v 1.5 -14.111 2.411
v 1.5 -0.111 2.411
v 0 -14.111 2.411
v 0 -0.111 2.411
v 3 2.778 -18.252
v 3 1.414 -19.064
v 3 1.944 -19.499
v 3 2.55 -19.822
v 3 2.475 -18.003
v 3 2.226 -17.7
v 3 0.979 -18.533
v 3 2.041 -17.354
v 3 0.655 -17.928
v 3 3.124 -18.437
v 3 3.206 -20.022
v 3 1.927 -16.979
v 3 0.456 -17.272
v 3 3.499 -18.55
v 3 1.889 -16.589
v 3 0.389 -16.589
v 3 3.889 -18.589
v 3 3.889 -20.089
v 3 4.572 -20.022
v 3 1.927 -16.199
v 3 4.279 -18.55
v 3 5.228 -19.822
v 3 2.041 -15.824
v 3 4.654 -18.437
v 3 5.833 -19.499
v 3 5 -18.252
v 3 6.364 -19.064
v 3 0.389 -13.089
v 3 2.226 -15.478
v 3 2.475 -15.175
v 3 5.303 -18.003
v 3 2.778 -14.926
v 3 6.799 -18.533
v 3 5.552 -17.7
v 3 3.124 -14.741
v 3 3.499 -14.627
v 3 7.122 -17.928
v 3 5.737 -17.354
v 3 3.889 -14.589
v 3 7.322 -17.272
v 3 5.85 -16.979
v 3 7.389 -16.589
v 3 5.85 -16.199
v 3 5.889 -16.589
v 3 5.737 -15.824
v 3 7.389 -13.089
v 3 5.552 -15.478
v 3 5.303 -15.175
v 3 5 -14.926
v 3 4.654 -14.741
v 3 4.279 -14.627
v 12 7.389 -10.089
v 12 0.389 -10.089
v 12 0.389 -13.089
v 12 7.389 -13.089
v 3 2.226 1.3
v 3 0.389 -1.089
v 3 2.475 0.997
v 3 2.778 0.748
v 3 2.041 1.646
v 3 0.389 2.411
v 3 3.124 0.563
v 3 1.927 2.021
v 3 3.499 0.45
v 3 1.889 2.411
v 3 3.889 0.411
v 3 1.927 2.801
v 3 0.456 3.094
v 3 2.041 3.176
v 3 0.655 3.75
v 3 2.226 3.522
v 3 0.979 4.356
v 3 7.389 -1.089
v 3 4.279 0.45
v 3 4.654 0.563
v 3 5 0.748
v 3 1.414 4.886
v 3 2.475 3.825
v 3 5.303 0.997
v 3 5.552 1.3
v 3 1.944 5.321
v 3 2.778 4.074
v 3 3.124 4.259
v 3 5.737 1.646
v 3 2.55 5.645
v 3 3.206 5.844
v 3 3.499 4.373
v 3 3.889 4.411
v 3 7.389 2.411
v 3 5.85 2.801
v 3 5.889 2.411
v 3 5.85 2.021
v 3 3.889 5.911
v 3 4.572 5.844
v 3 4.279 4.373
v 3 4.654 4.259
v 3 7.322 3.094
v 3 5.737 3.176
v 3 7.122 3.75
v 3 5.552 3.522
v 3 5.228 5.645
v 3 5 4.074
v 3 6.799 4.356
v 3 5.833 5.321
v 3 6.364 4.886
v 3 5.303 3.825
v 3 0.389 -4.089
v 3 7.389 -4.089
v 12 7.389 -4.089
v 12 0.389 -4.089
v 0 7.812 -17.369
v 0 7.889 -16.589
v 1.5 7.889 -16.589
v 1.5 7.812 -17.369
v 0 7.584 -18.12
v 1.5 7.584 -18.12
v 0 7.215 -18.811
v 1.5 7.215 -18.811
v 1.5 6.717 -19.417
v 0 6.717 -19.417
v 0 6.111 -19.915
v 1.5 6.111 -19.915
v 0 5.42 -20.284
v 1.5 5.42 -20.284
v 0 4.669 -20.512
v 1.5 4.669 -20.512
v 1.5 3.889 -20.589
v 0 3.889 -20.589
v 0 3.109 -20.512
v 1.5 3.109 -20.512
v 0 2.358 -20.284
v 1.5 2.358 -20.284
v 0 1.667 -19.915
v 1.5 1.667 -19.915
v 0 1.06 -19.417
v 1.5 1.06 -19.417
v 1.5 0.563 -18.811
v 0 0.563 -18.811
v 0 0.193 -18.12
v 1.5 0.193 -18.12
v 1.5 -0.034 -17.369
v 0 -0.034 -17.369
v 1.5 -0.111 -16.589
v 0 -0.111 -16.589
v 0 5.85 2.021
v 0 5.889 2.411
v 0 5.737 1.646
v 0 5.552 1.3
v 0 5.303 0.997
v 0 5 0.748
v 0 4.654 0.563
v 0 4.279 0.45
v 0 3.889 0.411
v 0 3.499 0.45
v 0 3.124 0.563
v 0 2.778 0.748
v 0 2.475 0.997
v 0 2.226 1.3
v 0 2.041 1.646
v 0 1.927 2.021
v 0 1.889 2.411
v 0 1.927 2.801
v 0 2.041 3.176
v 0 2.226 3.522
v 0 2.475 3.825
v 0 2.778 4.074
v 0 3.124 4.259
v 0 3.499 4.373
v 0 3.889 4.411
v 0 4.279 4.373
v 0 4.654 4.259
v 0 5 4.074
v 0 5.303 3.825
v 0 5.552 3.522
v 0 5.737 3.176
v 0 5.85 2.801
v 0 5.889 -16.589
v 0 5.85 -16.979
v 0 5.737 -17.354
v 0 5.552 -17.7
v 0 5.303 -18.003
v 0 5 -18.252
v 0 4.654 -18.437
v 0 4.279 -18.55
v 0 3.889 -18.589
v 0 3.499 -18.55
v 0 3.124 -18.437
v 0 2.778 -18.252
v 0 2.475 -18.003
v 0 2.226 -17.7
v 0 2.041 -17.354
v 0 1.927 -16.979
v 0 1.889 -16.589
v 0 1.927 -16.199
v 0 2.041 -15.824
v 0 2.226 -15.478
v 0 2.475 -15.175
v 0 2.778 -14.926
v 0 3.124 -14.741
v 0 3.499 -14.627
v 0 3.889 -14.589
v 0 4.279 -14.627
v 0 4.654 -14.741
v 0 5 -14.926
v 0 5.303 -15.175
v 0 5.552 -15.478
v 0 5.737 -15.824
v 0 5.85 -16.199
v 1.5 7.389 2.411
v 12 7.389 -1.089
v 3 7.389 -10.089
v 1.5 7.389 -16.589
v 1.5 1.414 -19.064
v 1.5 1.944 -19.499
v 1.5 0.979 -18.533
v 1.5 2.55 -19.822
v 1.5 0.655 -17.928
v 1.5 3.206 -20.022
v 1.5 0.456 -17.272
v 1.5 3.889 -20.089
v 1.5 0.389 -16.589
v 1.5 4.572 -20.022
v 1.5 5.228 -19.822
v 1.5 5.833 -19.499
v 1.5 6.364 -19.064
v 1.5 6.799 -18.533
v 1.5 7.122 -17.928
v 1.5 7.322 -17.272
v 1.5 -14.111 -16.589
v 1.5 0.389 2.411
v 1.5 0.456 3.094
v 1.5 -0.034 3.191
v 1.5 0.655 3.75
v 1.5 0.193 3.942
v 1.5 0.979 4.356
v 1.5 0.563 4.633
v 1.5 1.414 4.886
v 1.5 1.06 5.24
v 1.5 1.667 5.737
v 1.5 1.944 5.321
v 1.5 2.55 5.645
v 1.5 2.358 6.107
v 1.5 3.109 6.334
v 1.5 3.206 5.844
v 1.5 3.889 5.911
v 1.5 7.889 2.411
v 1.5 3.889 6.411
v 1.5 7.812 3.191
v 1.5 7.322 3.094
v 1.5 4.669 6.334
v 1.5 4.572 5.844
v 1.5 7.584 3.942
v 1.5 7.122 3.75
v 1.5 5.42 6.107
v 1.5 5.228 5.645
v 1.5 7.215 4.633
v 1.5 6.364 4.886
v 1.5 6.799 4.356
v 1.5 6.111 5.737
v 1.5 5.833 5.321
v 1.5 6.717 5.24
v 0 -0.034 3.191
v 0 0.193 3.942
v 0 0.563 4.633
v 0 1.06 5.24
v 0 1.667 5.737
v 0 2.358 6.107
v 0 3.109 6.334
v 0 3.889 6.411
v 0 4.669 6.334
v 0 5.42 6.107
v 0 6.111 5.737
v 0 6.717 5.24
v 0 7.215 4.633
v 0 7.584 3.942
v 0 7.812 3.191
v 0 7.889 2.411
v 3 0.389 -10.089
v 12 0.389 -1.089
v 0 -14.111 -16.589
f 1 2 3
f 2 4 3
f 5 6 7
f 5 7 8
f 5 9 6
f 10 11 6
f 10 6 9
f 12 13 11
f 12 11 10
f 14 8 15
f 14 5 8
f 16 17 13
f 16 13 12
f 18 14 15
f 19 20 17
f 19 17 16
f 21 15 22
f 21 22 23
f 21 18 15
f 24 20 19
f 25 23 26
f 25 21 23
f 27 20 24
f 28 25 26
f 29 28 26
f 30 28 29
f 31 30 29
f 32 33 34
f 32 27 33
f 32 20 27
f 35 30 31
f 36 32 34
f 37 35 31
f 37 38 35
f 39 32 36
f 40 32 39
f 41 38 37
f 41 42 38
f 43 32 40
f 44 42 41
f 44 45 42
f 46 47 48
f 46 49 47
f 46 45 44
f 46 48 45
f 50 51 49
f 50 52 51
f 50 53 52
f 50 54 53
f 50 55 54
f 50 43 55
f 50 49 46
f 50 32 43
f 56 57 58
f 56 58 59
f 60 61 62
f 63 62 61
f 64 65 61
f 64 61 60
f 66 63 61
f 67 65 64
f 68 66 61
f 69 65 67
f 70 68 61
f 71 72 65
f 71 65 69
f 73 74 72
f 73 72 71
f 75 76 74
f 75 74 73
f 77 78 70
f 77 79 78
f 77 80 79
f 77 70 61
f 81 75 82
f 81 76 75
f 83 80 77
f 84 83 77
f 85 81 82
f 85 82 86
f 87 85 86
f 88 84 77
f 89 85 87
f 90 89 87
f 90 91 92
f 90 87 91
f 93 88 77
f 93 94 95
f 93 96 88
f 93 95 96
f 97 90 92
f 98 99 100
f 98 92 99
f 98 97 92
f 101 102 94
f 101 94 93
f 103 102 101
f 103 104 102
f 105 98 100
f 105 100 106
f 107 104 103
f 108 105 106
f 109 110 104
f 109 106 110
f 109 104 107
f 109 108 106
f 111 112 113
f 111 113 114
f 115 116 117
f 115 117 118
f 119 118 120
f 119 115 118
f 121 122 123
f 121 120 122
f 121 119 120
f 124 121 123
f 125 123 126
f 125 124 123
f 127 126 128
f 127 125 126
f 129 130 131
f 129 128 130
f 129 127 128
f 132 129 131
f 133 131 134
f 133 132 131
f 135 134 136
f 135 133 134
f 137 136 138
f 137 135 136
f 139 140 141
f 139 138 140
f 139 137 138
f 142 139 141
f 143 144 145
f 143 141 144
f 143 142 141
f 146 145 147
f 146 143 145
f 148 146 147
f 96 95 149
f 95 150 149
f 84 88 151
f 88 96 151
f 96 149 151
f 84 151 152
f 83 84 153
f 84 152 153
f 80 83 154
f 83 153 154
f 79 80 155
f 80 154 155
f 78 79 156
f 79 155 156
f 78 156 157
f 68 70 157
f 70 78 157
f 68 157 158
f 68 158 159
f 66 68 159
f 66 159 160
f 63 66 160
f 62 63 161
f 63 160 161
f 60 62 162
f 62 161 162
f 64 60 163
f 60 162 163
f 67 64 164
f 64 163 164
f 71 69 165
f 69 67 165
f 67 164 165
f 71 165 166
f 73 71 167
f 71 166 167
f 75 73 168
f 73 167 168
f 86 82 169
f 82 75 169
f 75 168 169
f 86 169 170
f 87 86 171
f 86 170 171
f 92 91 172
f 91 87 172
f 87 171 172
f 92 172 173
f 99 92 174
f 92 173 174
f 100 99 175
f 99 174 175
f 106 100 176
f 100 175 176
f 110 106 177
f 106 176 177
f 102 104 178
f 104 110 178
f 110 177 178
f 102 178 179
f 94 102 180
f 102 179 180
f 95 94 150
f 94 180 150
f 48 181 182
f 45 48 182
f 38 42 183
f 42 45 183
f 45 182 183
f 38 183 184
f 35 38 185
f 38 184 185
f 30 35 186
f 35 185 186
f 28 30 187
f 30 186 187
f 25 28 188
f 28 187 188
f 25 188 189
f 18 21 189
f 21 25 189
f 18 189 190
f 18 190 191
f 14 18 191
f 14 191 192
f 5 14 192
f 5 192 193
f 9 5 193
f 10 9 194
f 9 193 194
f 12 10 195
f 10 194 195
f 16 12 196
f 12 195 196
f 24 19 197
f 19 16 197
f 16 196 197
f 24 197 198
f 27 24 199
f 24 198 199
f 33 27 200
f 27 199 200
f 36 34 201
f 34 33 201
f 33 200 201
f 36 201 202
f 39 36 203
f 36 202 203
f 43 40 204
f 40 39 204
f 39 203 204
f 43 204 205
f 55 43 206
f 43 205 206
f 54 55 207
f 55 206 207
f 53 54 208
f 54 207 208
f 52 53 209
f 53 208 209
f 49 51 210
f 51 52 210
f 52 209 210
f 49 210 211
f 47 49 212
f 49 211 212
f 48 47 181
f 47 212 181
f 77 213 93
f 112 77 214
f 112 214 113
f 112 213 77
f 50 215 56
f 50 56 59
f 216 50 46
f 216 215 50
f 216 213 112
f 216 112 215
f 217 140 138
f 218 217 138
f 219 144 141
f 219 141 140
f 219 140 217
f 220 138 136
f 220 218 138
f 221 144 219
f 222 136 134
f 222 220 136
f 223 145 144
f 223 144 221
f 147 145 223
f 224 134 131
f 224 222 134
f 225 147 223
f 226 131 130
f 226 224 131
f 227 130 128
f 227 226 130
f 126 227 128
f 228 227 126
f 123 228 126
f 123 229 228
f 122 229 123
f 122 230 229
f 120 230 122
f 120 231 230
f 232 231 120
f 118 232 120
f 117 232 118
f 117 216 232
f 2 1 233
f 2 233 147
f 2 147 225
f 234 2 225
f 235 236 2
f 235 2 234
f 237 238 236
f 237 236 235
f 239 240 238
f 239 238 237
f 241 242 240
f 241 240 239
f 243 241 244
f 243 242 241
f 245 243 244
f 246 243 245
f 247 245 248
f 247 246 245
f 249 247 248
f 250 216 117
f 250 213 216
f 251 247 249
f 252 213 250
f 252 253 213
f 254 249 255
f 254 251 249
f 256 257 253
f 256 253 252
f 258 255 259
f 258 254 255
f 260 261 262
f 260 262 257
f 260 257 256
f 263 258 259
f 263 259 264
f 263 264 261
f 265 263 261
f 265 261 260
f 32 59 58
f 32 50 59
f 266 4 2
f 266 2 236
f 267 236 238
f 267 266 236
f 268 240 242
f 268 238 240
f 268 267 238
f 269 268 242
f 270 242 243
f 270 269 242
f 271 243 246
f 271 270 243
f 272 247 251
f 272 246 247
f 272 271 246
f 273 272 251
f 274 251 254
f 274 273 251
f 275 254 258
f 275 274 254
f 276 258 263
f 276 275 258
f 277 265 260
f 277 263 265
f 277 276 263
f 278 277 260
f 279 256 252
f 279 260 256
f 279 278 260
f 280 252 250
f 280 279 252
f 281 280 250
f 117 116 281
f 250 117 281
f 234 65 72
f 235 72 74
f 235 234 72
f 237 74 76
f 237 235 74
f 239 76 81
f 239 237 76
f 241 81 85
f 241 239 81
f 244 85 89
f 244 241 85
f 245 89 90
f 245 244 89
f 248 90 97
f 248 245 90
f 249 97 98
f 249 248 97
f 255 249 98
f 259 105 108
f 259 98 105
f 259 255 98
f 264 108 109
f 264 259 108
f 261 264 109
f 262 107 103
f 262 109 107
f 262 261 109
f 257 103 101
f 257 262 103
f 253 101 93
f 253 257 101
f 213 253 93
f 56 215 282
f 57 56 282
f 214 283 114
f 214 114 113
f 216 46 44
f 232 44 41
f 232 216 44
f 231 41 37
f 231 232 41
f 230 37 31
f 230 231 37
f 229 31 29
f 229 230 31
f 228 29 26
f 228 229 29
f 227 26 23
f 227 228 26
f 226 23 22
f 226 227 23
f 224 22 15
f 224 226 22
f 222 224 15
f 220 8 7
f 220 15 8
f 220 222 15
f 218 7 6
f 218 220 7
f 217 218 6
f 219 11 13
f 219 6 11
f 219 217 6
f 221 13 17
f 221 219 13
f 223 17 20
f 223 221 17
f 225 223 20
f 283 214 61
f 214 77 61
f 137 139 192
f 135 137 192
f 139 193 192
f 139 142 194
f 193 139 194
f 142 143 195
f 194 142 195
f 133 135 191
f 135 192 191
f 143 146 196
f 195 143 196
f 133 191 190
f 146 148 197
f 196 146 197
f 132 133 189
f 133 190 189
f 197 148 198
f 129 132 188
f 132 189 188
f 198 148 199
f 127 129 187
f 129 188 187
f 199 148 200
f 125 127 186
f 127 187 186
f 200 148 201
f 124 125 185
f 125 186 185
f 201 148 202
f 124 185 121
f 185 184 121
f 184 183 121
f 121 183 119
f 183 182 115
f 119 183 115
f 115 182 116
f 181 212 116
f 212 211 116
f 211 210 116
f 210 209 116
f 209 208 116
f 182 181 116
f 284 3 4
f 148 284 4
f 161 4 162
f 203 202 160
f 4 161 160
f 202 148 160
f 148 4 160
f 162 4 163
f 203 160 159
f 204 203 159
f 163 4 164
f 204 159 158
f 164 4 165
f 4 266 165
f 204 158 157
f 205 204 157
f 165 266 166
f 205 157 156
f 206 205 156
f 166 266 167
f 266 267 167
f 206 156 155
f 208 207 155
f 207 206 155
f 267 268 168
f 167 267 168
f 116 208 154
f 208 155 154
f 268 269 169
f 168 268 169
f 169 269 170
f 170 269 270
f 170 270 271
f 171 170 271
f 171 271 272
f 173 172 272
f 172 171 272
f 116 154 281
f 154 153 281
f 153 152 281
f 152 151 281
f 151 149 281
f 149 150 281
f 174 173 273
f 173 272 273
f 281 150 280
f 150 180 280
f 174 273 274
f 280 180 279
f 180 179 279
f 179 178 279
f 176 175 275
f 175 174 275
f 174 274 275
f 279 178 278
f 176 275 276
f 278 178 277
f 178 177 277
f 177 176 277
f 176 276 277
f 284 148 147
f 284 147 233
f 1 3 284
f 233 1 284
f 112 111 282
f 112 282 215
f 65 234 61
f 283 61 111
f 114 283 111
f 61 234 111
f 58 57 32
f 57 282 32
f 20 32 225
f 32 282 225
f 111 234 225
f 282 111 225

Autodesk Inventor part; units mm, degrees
ref_plane "YZ Plane" through (0, 0, 0) normal (1, 0, 0) x (0, 1, 0)
ref_plane "XZ Plane" through (0, 0, 0) normal (0, 1, 0) x (-1, 0, 0)
ref_plane "XY Plane" through (0, 0, 0) normal (0, 0, 1) x (1, 0, 0)
sketch "Sketch1" plane through (0, 0, 0) normal (1, 0, 0) x (0, 1, 0)
  line L0 (-14.1111, 2.4111) -> (-14.1111, -16.5889)
  line L1 (7.8889, -16.5889) -> (7.8889, 2.4111)
  arc A0 (7.8889, 2.4111) -> (-0.1111, 2.4111) centre (3.8889, 2.4111) ccw
  arc A1 (-0.1111, -16.5889) -> (7.8889, -16.5889) centre (3.8889, -16.5889) ccw
  line L2 (-0.1111, 2.4111) -> (-14.1111, 2.4111)
  line L3 (-0.1111, -16.5889) -> (-14.1111, -16.5889)
  line L4 (7.3889, -10.0889) -> (0.3889, -10.0889)
  line L5 (7.3889, -13.0889) -> (0.3889, -13.0889)
  line L6 (7.3889, -4.0889) -> (0.3889, -4.0889)
  line L7 (7.3889, -1.0889) -> (0.3889, -1.0889)
  line L8 (7.3889, 2.4111) -> (7.3889, -16.5889)
  arc A2 (0.3889, -16.5889) -> (7.3889, -16.5889) centre (3.8889, -16.5889) ccw
  arc A3 (7.3889, 2.4111) -> (0.3889, 2.4111) centre (3.8889, 2.4111) ccw
  line L9 (0.3889, 2.4111) -> (0.3889, -16.5889)
  circle A4 centre (3.8889, 2.4111) radius 2
  circle A5 centre (3.8889, -16.5889) radius 2
  point P0 (0, 0)
  dimension "d5" = 0.5
  dimension "d6" = 4
  dimension "d7" = 4
extrude "Extrusion1" add sketch "Sketch1" along normal blind 1.5 contours L2 A0 L1 A1 L3 L0 | L8 L5 L9 L4 | L4 L9 L6 L8 | L6 L9 L7 L8 | L8 A2 L9 L5 | L7 L9 A3 L8
extrude "Extrusion2" add sketch "Sketch1" along normal blind 3 contours L8 L5 L9 L4 | L4 L9 L6 L8 | L6 L9 L7 L8 | L8 A2 L9 L5 | L7 L9 A3 L8
extrude "Extrusion3" add sketch "Sketch1" along normal blind 12 contours L8 L5 L9 L4 | L6 L9 L7 L8
properties part number "HC020K"
